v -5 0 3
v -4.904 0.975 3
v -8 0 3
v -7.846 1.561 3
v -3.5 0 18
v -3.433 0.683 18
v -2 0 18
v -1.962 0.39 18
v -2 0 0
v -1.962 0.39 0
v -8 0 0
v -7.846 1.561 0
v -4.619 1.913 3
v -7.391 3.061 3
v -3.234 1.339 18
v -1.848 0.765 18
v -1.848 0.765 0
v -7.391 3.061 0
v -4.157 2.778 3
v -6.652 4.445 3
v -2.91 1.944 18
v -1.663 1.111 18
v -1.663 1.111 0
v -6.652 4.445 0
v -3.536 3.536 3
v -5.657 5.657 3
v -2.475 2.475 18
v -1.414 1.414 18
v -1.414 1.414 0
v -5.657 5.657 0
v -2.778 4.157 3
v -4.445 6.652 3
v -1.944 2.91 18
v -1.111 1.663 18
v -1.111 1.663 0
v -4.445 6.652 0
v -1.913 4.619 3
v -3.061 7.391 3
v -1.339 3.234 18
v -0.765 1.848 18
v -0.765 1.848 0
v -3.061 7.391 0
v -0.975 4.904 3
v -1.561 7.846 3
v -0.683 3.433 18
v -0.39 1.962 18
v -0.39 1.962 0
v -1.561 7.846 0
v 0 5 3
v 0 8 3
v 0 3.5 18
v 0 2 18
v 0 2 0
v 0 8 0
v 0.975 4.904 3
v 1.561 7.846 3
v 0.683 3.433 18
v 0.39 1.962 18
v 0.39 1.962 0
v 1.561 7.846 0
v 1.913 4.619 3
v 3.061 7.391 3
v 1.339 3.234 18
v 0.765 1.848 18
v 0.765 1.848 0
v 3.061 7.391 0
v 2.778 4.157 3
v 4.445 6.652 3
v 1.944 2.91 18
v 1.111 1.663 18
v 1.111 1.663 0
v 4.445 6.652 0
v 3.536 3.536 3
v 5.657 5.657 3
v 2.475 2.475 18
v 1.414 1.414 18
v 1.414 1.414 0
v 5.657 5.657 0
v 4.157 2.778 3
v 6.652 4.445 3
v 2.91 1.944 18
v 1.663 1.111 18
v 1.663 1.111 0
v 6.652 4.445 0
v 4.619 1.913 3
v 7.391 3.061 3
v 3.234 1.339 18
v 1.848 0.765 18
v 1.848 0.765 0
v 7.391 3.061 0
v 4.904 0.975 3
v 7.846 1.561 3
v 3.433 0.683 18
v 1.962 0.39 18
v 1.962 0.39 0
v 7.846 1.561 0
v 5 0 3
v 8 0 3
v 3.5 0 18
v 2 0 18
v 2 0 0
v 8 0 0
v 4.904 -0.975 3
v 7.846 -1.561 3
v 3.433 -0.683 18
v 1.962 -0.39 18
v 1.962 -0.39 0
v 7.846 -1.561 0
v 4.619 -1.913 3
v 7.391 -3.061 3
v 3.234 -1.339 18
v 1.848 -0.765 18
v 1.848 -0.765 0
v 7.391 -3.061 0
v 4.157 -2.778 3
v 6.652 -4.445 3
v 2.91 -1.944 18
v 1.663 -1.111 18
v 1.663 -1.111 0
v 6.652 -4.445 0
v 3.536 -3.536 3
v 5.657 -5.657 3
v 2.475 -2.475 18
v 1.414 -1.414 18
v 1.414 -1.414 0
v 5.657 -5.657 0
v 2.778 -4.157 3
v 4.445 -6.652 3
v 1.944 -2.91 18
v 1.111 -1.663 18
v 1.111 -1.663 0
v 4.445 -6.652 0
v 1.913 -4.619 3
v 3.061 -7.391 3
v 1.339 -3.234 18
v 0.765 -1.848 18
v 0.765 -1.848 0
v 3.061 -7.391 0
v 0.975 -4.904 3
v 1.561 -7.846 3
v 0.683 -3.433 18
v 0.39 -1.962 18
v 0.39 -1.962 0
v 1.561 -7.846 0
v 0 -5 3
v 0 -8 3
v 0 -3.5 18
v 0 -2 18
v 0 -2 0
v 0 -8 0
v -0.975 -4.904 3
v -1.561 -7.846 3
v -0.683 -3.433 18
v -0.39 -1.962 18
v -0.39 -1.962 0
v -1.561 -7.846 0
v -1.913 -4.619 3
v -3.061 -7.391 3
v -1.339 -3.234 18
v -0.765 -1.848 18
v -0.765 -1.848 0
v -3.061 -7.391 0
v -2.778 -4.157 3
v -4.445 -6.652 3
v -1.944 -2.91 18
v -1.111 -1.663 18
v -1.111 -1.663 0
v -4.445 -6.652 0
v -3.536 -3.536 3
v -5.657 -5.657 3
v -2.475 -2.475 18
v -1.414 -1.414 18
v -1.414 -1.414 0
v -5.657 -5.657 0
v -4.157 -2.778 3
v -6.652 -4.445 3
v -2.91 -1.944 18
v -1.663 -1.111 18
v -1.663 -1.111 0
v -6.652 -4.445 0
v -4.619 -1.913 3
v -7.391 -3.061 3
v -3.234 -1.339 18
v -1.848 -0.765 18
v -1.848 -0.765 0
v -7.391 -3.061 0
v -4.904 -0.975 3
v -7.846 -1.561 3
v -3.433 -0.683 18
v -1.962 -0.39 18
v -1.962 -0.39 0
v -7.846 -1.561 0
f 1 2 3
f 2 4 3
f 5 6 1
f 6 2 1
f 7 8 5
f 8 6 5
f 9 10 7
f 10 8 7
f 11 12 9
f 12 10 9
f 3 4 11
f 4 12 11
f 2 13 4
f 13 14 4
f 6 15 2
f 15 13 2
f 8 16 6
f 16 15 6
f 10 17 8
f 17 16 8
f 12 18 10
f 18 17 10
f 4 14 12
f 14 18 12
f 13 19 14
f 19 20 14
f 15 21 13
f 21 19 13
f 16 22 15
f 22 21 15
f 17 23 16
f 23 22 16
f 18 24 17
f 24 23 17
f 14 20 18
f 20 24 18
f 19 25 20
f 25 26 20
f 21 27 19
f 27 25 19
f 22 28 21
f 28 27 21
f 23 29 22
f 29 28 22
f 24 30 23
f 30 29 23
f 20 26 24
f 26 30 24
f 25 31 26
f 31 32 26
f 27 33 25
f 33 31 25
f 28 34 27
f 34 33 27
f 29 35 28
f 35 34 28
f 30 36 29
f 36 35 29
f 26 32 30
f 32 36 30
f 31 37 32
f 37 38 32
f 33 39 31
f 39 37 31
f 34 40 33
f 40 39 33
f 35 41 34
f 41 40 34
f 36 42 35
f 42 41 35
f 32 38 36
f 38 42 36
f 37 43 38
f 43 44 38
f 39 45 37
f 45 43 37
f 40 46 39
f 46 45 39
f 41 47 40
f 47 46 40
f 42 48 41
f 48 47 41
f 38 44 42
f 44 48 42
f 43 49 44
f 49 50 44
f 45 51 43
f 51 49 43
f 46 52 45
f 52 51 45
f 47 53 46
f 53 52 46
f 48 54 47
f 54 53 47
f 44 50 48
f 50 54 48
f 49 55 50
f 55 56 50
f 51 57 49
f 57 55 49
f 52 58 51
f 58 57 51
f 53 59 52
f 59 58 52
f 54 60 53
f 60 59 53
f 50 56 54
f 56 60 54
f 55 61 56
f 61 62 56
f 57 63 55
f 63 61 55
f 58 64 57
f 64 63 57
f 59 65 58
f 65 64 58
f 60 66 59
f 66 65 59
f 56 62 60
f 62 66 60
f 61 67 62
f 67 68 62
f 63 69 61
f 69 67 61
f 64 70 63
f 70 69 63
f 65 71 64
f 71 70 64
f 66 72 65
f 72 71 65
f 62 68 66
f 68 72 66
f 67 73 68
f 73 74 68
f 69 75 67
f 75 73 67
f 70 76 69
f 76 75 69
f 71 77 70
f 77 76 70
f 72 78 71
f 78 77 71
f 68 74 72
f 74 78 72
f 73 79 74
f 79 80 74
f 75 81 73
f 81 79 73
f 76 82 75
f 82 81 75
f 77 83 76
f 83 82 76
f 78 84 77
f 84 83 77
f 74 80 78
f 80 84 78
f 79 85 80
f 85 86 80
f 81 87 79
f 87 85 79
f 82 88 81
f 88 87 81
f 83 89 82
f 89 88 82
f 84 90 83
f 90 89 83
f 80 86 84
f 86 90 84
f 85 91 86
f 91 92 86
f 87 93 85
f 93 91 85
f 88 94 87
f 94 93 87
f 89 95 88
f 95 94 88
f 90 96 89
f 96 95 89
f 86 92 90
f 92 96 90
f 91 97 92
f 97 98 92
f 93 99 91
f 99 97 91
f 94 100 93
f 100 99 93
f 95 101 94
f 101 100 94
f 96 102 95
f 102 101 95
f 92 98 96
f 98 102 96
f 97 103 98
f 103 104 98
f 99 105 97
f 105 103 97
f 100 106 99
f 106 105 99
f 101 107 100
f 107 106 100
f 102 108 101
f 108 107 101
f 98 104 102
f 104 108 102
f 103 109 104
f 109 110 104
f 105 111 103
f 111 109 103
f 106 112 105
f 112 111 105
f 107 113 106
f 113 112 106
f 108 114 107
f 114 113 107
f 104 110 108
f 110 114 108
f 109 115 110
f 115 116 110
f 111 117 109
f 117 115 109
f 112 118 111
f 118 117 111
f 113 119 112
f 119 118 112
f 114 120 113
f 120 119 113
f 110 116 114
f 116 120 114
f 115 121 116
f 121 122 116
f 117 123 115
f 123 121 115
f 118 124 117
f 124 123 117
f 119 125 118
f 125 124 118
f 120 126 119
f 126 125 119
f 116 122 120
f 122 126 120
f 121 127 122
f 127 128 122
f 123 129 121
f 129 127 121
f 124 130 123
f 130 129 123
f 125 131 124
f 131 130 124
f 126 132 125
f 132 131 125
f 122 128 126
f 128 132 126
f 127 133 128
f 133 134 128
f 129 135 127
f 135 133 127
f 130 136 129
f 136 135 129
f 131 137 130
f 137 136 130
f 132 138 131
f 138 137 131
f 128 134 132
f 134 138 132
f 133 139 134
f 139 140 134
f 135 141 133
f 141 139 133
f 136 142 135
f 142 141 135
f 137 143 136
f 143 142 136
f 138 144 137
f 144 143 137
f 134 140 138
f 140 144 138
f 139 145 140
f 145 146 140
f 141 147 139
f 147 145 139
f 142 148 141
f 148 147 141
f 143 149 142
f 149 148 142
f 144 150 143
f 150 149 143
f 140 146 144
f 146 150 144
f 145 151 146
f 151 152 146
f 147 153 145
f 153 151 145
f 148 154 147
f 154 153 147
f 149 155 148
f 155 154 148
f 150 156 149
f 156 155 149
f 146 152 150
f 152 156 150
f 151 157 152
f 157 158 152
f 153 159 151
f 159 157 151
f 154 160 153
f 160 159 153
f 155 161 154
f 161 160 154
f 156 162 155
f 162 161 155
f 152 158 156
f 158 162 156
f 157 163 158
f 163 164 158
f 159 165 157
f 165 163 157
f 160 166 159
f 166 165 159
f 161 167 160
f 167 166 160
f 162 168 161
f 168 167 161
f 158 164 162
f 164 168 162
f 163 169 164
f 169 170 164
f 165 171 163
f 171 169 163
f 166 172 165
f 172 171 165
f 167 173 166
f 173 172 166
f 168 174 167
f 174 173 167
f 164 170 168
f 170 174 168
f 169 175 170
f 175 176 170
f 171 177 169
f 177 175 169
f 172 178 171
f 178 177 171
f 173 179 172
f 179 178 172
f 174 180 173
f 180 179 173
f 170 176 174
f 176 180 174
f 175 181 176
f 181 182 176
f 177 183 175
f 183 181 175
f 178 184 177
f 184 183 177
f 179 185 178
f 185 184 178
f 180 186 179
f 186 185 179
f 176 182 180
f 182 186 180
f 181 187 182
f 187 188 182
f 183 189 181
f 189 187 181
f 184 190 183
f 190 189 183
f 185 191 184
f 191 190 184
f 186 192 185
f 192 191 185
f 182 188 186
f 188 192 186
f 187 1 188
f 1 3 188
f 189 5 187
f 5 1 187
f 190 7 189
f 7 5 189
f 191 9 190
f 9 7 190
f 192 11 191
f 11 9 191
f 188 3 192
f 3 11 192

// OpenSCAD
$fn = 32;

// ----------------------------------------------------------------------
// Profiled standoff: conical spacer, 18 mm long, bore 4 mm
// ----------------------------------------------------------------------

// --- parameters (mm) ---
revolve_angle = 360;      // full turn around the Z axis
profile_points = 6;       // points of the closed outline

profile = [[2, 0], [8, 0], [8, 3], [5, 3], [3.5, 18], [2, 18]];  // single closed polygon, 6 points, counter clockwise

// --- the one profile operation ---
rotate_extrude(angle = revolve_angle) polygon(points = profile);
